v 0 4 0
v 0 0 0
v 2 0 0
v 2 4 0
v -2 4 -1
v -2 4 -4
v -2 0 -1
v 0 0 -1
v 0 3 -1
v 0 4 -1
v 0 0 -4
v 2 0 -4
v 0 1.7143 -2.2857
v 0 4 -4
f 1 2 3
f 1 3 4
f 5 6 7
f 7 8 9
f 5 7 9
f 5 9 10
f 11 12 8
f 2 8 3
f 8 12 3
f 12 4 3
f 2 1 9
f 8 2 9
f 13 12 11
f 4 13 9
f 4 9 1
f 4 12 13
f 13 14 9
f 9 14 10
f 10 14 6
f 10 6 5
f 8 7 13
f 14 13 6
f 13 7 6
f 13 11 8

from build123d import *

# Parameters (mm, degrees)
SKETCH1_W           = 4
SKETCH1_H           = 4
BOSS_EXTRUDE1_DEPTH = 2
SKETCH2_W           = 3
SKETCH2_H           = 4
BOSS_EXTRUDE2_DEPTH = 2
CUT_EXTRUDE1_DEPTH  = 2
CUT_EXTRUDE2_DEPTH  = 2


with BuildPart() as part:
    # Sketch1 → Boss-Extrude1 (new body)
    with BuildSketch(Plane(origin=(0, 0, 0), x_dir=(0, 0, -1), z_dir=(1, 0, 0))):
        with Locations((2, 2)):
            Rectangle(SKETCH1_W, SKETCH1_H)
    extrude(amount=BOSS_EXTRUDE1_DEPTH)

    # Sketch2 → Boss-Extrude2 (add)
    with BuildSketch(Plane.ZY):
        with Locations((-2.5, 2)):
            Rectangle(SKETCH2_W, SKETCH2_H)
    extrude(amount=BOSS_EXTRUDE2_DEPTH)

    # Sketch3 → Cut-Extrude1 (cut)
    with BuildSketch(Plane(origin=(2, 0, 0), x_dir=(0, 0, -1), z_dir=(1, 0, 0))):
        Polygon((4, 0), (0, 4), (4, 4), align=None)
    extrude(amount=-CUT_EXTRUDE1_DEPTH, mode=Mode.SUBTRACT)

    # Sketch4 → Cut-Extrude2 (cut)
    with BuildSketch(Plane.ZY.offset(2)):
        Polygon((-1, 0), (-4, 4), (-4, 0), align=None)
    extrude(amount=-CUT_EXTRUDE2_DEPTH, mode=Mode.SUBTRACT)


solid = part.part
